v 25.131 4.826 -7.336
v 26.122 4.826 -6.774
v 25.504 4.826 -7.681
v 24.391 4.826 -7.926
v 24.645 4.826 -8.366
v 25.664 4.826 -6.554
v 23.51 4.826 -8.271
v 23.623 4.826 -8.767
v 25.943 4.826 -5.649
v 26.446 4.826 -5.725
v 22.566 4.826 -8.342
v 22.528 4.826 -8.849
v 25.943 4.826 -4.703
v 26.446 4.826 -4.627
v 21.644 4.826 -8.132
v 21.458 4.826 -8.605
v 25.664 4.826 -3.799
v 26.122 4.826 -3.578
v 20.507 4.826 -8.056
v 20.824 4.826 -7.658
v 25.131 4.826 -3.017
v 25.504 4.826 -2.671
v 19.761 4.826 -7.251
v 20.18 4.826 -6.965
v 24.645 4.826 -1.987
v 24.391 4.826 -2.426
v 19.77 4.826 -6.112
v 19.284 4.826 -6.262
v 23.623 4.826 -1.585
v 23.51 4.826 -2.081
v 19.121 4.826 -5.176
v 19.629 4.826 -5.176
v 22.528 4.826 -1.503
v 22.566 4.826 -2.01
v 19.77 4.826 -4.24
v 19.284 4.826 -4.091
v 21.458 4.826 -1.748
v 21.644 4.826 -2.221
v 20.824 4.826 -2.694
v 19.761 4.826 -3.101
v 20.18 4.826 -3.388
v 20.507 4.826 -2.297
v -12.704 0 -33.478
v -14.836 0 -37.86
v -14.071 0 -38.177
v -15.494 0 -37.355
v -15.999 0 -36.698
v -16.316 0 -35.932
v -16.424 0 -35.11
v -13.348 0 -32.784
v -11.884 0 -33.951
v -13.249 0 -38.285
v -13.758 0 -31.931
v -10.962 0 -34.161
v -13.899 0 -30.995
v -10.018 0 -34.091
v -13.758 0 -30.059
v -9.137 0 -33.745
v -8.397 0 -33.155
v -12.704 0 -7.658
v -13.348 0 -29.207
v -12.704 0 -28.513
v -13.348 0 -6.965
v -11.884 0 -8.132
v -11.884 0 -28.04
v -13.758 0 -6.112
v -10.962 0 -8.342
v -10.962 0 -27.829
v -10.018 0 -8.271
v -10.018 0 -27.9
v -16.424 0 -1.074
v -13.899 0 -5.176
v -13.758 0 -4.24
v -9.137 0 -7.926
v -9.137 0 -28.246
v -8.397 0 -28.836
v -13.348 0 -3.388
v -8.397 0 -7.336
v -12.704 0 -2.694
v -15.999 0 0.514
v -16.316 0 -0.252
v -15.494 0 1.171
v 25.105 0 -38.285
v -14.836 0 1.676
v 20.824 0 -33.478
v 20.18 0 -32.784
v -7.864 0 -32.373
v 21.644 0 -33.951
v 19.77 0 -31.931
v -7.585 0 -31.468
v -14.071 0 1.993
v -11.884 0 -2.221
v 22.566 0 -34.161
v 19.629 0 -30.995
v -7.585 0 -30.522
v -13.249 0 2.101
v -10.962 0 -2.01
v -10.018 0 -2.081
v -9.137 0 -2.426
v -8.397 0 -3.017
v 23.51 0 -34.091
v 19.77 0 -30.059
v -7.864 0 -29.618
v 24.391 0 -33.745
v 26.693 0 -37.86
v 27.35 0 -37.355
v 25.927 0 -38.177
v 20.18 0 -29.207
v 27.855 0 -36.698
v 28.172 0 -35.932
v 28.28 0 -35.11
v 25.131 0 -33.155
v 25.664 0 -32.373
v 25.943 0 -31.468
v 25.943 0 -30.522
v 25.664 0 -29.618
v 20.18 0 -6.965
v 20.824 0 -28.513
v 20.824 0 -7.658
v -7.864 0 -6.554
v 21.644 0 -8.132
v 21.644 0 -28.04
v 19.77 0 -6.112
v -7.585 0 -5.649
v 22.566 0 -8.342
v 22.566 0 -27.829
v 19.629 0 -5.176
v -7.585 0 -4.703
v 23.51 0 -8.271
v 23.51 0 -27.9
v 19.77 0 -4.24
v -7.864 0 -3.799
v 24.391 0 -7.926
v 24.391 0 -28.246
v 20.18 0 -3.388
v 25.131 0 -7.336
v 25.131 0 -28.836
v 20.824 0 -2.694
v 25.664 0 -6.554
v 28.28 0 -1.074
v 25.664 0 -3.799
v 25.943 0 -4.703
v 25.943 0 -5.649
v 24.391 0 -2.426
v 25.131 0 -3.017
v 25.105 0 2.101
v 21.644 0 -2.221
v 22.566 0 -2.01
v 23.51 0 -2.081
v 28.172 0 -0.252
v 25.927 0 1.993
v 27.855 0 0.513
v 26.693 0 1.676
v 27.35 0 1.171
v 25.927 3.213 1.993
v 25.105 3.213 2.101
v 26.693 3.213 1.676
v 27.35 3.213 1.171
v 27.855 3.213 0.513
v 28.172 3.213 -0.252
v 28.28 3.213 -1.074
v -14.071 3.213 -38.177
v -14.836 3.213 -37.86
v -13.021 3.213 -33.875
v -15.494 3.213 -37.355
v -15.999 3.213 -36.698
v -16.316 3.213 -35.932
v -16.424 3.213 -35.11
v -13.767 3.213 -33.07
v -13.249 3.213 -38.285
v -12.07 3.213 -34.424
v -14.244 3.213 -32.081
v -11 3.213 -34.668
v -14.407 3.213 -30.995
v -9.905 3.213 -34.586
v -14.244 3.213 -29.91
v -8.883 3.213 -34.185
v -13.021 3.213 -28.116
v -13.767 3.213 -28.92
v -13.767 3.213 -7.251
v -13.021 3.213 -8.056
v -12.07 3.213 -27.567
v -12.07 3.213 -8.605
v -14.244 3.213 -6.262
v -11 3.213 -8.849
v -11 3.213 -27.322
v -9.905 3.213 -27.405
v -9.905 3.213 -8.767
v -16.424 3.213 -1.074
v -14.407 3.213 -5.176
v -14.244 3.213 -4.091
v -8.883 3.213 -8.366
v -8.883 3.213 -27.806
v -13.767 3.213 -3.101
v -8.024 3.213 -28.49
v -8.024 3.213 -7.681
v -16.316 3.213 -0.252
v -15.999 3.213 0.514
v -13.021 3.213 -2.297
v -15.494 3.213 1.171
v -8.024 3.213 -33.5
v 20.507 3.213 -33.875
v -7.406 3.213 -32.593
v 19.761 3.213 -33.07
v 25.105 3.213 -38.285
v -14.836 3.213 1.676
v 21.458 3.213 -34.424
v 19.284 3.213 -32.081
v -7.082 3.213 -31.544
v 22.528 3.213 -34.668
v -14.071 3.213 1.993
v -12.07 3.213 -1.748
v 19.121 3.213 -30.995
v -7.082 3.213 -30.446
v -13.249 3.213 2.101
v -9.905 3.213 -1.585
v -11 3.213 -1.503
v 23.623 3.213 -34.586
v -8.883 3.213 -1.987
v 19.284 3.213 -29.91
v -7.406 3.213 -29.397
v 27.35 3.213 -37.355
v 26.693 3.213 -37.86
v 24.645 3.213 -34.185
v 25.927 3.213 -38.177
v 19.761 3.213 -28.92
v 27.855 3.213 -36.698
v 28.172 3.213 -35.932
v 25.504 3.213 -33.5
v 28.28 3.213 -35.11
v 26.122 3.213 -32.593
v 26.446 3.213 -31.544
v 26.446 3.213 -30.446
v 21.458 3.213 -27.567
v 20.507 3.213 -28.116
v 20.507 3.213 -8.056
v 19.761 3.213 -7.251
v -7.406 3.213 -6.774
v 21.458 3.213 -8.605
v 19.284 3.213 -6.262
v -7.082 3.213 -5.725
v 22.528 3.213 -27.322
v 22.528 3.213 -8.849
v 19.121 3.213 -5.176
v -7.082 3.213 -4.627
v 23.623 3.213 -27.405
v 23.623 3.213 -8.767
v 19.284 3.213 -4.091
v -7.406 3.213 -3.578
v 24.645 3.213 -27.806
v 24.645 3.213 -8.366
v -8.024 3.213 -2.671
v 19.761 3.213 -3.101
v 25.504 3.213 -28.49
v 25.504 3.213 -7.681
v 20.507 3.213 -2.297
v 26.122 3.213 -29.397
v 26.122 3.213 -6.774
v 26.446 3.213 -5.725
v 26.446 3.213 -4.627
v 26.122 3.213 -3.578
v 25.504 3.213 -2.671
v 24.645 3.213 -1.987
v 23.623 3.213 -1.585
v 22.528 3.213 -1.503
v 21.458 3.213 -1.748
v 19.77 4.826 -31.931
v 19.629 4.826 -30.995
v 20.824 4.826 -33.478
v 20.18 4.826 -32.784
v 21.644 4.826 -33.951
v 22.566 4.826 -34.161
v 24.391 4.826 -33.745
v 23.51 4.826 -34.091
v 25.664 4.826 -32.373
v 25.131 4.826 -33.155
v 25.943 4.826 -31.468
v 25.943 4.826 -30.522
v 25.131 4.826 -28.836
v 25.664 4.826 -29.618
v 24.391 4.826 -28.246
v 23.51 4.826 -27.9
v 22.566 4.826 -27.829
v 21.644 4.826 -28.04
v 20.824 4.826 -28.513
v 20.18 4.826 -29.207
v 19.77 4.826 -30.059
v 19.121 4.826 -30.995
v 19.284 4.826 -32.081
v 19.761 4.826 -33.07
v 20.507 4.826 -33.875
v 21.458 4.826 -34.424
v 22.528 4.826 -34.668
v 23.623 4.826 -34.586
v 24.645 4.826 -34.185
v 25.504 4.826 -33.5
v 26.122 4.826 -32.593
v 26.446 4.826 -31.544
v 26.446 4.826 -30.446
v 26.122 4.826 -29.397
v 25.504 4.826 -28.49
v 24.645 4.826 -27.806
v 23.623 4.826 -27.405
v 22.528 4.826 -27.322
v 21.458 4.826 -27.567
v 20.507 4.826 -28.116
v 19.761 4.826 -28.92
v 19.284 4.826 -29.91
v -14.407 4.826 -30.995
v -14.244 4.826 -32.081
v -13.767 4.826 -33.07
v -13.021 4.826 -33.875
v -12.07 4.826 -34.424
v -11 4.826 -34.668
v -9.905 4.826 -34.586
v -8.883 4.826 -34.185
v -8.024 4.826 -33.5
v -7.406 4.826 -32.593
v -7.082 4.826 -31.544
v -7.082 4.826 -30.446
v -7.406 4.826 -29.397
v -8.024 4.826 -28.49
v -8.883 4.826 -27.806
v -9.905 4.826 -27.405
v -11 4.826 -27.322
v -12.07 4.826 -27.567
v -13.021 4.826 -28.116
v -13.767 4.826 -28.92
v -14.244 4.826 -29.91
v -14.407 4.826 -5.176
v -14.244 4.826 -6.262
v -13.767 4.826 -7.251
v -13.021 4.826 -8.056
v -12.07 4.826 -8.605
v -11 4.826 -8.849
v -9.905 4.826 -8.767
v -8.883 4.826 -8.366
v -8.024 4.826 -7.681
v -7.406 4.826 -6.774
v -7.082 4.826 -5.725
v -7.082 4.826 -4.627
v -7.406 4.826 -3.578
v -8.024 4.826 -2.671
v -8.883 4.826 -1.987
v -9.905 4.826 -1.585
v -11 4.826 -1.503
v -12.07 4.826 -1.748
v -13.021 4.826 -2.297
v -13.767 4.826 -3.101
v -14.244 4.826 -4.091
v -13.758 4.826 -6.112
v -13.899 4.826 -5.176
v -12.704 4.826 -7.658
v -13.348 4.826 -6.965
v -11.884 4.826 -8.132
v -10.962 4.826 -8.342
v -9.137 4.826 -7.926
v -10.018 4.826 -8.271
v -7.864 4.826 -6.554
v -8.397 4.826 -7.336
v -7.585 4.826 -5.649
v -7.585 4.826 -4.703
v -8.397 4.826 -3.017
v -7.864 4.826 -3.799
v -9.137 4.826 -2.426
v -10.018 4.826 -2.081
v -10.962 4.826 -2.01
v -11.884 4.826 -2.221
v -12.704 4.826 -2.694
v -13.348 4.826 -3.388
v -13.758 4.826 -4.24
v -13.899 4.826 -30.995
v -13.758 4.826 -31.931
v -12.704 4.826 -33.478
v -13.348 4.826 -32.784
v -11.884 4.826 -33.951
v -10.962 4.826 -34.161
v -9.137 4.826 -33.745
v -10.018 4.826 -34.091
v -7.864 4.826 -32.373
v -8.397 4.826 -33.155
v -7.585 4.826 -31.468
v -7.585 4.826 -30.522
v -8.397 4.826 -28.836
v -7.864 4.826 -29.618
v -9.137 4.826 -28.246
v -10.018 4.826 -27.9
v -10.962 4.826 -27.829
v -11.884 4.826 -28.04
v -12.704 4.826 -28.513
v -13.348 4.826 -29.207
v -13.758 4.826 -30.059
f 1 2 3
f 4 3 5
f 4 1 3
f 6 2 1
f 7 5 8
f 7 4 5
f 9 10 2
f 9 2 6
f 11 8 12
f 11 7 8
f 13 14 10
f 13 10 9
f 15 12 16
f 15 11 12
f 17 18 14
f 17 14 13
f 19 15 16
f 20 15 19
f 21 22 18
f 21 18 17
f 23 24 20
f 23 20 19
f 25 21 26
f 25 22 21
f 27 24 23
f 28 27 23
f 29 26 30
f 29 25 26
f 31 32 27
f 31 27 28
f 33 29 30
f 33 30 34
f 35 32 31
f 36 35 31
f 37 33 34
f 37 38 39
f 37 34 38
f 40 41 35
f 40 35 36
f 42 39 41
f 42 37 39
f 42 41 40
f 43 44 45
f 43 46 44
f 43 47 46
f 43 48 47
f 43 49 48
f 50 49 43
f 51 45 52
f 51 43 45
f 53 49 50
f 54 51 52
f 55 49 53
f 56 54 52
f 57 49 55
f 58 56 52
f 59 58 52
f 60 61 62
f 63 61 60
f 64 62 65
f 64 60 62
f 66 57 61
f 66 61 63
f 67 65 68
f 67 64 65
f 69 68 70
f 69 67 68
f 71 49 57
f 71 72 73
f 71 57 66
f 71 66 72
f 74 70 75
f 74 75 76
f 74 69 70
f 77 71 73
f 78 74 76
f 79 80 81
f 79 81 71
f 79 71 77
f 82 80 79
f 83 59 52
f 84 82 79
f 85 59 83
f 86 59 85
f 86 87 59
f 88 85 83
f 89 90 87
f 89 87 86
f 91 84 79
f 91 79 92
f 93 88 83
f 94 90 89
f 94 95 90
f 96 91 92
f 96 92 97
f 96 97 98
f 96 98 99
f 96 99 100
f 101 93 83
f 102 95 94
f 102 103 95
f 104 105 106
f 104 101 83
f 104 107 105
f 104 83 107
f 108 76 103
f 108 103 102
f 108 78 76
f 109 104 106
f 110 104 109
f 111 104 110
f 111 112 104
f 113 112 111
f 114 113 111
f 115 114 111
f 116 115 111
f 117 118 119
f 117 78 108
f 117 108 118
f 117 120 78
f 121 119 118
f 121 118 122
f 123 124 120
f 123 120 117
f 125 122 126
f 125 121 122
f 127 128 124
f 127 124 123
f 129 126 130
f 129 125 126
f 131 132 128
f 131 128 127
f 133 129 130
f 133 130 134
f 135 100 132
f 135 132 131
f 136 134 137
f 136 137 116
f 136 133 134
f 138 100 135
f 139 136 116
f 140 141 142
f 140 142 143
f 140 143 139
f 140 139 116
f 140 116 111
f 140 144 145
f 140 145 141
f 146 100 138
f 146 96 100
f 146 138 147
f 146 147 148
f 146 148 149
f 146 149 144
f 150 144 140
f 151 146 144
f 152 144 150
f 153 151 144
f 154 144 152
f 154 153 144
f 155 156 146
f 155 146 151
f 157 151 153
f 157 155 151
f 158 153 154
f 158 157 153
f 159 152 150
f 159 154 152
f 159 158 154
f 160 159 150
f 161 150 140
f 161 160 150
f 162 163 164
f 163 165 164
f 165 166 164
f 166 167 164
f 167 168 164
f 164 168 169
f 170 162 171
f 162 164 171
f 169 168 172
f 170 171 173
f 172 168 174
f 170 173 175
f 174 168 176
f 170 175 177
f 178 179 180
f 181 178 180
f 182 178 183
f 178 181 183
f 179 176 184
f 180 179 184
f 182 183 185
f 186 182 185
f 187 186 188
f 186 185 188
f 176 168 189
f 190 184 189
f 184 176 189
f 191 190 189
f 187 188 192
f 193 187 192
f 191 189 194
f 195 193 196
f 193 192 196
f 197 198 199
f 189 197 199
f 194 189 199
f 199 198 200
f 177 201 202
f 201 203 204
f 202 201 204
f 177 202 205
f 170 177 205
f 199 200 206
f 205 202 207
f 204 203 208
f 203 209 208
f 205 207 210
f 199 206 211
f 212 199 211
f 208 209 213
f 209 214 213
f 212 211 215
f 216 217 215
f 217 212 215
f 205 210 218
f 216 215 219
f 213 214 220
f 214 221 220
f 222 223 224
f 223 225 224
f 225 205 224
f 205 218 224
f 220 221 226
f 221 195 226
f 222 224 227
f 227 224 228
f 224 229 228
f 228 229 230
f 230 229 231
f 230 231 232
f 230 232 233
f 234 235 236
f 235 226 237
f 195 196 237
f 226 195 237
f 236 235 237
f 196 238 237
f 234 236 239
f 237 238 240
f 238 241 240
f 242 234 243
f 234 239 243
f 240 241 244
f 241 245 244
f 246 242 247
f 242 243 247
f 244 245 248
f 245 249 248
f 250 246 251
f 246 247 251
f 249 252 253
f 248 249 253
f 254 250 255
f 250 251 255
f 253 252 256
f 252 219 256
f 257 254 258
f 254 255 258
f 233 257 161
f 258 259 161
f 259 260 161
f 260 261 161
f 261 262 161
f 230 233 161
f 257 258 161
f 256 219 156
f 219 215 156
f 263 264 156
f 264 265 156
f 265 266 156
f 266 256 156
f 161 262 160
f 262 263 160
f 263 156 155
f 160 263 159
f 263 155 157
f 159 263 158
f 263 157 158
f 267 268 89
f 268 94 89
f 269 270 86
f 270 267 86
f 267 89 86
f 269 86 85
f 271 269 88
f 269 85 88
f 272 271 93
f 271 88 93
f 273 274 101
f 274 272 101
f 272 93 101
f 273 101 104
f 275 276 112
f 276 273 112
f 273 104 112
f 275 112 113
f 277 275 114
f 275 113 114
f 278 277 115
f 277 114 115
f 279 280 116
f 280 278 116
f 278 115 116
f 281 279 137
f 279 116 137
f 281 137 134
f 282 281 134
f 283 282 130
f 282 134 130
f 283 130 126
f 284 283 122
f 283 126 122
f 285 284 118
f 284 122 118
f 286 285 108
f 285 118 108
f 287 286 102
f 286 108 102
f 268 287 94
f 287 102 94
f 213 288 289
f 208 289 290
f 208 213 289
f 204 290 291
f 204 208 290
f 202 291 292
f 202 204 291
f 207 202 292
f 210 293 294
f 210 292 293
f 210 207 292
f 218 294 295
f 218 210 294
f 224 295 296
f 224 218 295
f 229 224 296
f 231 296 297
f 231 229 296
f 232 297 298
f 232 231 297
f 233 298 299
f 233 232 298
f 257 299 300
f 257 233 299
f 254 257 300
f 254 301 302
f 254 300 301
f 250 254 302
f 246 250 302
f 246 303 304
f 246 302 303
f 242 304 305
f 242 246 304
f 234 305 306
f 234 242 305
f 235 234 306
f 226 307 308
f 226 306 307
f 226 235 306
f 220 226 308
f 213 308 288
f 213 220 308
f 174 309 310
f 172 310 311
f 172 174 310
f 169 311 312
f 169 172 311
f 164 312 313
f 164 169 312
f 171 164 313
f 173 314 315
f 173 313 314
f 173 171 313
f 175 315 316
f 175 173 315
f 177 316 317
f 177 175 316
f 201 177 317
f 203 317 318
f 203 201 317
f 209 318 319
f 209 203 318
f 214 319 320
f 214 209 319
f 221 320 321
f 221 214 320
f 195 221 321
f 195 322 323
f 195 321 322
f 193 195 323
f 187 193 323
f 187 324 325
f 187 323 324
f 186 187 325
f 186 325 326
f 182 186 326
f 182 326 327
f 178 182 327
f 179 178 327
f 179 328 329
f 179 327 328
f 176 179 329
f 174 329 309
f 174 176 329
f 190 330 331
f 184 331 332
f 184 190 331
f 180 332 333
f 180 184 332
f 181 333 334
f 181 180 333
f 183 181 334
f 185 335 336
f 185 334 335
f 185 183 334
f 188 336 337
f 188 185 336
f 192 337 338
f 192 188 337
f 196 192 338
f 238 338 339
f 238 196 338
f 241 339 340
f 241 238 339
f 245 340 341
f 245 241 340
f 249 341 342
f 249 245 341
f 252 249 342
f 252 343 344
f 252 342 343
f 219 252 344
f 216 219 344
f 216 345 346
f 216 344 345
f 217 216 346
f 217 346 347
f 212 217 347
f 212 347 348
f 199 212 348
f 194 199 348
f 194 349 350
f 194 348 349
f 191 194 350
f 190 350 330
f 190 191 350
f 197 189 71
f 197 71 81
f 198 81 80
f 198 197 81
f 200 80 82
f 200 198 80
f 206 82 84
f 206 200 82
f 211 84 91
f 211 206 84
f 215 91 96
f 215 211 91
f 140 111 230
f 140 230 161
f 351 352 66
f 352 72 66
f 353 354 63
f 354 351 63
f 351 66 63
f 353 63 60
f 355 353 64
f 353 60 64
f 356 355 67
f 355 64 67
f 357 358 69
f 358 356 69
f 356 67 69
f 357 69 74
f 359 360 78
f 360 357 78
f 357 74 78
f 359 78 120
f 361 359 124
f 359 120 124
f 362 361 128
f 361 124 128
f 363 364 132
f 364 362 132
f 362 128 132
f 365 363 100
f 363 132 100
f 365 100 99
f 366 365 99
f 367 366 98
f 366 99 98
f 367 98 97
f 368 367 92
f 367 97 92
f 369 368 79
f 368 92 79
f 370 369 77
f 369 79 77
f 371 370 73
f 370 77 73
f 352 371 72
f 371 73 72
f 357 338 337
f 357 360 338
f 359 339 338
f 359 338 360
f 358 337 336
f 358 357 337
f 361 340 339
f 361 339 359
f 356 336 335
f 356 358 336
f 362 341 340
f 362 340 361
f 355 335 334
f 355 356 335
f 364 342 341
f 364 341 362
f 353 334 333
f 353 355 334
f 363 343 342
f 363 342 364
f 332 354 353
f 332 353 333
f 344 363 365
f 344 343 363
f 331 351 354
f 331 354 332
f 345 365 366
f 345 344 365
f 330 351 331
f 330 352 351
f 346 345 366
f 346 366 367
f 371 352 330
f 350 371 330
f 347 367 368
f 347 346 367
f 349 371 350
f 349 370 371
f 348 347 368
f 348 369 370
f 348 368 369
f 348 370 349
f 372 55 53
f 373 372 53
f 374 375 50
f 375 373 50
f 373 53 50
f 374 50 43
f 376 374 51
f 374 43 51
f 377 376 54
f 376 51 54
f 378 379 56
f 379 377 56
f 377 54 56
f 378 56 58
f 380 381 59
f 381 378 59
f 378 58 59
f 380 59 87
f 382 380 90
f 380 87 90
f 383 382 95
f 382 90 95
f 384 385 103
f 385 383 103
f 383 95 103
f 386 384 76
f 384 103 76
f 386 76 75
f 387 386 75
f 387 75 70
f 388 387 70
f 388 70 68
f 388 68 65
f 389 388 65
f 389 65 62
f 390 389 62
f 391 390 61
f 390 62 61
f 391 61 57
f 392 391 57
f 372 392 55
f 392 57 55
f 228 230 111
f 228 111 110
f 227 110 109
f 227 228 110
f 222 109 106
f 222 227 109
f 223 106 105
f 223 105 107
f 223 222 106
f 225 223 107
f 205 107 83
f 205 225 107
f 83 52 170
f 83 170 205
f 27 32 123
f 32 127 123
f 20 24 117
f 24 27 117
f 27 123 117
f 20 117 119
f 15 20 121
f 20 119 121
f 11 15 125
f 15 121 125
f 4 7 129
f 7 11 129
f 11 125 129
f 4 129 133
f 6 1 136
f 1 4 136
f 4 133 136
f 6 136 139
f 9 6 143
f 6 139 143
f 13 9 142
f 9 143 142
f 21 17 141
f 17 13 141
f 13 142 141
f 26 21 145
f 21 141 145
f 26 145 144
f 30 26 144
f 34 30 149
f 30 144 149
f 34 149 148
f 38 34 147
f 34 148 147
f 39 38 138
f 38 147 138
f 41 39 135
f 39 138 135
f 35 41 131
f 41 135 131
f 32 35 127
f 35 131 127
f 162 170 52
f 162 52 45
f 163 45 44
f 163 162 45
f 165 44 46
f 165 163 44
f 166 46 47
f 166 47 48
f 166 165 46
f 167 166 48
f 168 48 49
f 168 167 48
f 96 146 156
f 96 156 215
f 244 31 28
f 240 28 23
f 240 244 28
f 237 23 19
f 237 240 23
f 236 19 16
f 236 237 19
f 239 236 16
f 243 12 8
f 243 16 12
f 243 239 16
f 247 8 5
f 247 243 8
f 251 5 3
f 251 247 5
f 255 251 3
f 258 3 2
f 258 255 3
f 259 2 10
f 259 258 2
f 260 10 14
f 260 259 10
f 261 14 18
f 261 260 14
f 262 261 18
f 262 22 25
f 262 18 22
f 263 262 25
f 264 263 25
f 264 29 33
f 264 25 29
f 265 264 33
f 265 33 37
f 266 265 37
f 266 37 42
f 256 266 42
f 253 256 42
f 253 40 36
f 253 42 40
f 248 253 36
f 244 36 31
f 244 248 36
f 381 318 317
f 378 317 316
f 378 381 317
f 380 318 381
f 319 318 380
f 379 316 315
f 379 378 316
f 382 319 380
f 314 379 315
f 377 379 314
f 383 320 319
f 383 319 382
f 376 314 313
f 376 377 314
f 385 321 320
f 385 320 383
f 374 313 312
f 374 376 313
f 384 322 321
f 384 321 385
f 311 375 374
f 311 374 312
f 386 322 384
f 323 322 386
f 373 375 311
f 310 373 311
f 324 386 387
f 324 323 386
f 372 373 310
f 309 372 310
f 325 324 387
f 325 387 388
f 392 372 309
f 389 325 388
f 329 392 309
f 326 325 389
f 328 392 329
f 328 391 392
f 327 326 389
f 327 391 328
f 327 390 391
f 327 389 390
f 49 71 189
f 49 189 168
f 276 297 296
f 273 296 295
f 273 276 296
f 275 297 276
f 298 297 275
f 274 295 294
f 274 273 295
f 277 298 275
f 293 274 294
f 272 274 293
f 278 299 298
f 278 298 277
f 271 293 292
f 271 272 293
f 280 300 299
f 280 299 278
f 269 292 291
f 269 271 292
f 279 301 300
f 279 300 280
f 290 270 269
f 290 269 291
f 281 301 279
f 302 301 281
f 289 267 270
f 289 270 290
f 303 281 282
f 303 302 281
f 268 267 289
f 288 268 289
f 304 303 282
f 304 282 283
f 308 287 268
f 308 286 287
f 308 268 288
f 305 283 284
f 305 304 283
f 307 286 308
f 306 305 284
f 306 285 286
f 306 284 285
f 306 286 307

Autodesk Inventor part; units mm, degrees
ref_plane "YZ Plane" through (0, 0, 0) normal (1, 0, 0) x (0, 1, 0)
ref_plane "XZ Plane" through (0, 0, 0) normal (0, 1, 0) x (-1, 0, 0)
ref_plane "XY Plane" through (0, 0, 0) normal (0, 0, 1) x (1, 0, 0)
sketch "Sketch1" plane through (0, 0, 0) normal (0, 1, 0) x (-1, 0, 0)
  circle A0 centre (10.7243, -30.9952) radius 3.175 projected
  circle A1 centre (10.7243, -5.1761) radius 3.175 projected
  circle A2 centre (-22.8037, -5.1761) radius 3.175 projected
  circle A3 centre (-22.8037, -30.9952) radius 3.175 projected
  line L0 (16.4239, -38.285) -> (-28.2801, -38.285)
  line L1 (-28.2801, -38.285) -> (-28.2801, 2.101)
  line L2 (-28.2801, 2.101) -> (16.4239, 2.101)
  line L3 (16.4239, 2.101) -> (16.4239, -38.285)
  circle A4 centre (-22.8037, -30.9952) radius 3.683
  circle A5 centre (-22.8037, -5.1761) radius 3.683
  circle A6 centre (10.7243, -5.1761) radius 3.683
  circle A7 centre (10.7243, -30.9952) radius 3.683
  line L4 (-28.2801, 2.101) -> (16.4239, 2.101)
  line L5 (16.4239, 2.101) -> (16.4239, -38.285)
  line L6 (16.4239, -38.285) -> (-28.2801, -38.285)
  line L7 (-28.2801, -38.285) -> (-28.2801, 2.101)
  circle A8 centre (10.7243, -5.1761) radius 3.175
  circle A9 centre (10.7243, -30.9952) radius 3.175
  circle A10 centre (-22.8037, -30.9952) radius 3.175
  circle A11 centre (-22.8037, -5.1761) radius 3.175
  point P0 (0, 0)
  dimension "d0" = 44.704
  dimension "d1" = 40.386
  dimension "d2" = 7.2898
  dimension "d3" = 7.2771
  dimension "d4" = 7.366
  dimension "d5" = 7.366
  dimension "d6" = 7.366
  dimension "d7" = 7.366
extrude "Extrusion1" add sketch "Sketch1" along normal blind 4.826 contours A4 | A5 | A6 | A7
sketch "Sketch2" plane through (-10.7243, 0, -30.9952) normal (0, -1, 0) x (1, 0, 0)
  line L0 (39.0044, 33.0962) -> (-5.6996, 33.0962) projected
  line L1 (39.0044, -7.2898) -> (39.0044, 33.0962) projected
  line L2 (-5.6996, -7.2898) -> (39.0044, -7.2898) projected
  line L3 (-5.6996, 33.0962) -> (-5.6996, -7.2898) projected
  line L4 (39.0044, 33.0962) -> (-5.6996, 33.0962)
  line L5 (-5.6996, 33.0962) -> (-5.6996, -7.2898)
  line L6 (-5.6996, -7.2898) -> (39.0044, -7.2898)
  line L7 (39.0044, -7.2898) -> (39.0044, 33.0962)
  circle A0 centre (33.528, 0) radius 3.175 projected
  circle A1 centre (0, 0) radius 3.175 projected
  circle A2 centre (0, 25.8191) radius 3.175 projected
  circle A3 centre (33.528, 25.8191) radius 3.175 projected
  circle A4 centre (33.528, 0) radius 3.175
  circle A5 centre (0, 0) radius 3.175
  circle A6 centre (0, 25.8191) radius 3.175
  circle A7 centre (33.528, 25.8191) radius 3.175
  point P0 (10.7243, 30.9952)
extrude "Extrusion2" add sketch "Sketch2" against normal blind 3.2131
fillet "Fillet1" radius 3.175 4 edges at (-16.4239, 1.6065, 2.101) (28.2801, 1.6065, 2.101) (28.2801, 1.6065, -38.285) (-16.4239, 1.6065, -38.285)
thread "Thread1" size "1/4-20 UNC" class "2B" standard "ANSI Unified Screw Threads" full length
thread "Thread2" size "1/4-20 UNC" class "2B" standard "ANSI Unified Screw Threads" full length
thread "Thread3" size "1/4-20 UNC" class "2B" standard "ANSI Unified Screw Threads" full length
thread "Thread4" size "1/4-20 UNC" class "2B" standard "ANSI Unified Screw Threads" full length
properties part number "WheelBracketConnector"
